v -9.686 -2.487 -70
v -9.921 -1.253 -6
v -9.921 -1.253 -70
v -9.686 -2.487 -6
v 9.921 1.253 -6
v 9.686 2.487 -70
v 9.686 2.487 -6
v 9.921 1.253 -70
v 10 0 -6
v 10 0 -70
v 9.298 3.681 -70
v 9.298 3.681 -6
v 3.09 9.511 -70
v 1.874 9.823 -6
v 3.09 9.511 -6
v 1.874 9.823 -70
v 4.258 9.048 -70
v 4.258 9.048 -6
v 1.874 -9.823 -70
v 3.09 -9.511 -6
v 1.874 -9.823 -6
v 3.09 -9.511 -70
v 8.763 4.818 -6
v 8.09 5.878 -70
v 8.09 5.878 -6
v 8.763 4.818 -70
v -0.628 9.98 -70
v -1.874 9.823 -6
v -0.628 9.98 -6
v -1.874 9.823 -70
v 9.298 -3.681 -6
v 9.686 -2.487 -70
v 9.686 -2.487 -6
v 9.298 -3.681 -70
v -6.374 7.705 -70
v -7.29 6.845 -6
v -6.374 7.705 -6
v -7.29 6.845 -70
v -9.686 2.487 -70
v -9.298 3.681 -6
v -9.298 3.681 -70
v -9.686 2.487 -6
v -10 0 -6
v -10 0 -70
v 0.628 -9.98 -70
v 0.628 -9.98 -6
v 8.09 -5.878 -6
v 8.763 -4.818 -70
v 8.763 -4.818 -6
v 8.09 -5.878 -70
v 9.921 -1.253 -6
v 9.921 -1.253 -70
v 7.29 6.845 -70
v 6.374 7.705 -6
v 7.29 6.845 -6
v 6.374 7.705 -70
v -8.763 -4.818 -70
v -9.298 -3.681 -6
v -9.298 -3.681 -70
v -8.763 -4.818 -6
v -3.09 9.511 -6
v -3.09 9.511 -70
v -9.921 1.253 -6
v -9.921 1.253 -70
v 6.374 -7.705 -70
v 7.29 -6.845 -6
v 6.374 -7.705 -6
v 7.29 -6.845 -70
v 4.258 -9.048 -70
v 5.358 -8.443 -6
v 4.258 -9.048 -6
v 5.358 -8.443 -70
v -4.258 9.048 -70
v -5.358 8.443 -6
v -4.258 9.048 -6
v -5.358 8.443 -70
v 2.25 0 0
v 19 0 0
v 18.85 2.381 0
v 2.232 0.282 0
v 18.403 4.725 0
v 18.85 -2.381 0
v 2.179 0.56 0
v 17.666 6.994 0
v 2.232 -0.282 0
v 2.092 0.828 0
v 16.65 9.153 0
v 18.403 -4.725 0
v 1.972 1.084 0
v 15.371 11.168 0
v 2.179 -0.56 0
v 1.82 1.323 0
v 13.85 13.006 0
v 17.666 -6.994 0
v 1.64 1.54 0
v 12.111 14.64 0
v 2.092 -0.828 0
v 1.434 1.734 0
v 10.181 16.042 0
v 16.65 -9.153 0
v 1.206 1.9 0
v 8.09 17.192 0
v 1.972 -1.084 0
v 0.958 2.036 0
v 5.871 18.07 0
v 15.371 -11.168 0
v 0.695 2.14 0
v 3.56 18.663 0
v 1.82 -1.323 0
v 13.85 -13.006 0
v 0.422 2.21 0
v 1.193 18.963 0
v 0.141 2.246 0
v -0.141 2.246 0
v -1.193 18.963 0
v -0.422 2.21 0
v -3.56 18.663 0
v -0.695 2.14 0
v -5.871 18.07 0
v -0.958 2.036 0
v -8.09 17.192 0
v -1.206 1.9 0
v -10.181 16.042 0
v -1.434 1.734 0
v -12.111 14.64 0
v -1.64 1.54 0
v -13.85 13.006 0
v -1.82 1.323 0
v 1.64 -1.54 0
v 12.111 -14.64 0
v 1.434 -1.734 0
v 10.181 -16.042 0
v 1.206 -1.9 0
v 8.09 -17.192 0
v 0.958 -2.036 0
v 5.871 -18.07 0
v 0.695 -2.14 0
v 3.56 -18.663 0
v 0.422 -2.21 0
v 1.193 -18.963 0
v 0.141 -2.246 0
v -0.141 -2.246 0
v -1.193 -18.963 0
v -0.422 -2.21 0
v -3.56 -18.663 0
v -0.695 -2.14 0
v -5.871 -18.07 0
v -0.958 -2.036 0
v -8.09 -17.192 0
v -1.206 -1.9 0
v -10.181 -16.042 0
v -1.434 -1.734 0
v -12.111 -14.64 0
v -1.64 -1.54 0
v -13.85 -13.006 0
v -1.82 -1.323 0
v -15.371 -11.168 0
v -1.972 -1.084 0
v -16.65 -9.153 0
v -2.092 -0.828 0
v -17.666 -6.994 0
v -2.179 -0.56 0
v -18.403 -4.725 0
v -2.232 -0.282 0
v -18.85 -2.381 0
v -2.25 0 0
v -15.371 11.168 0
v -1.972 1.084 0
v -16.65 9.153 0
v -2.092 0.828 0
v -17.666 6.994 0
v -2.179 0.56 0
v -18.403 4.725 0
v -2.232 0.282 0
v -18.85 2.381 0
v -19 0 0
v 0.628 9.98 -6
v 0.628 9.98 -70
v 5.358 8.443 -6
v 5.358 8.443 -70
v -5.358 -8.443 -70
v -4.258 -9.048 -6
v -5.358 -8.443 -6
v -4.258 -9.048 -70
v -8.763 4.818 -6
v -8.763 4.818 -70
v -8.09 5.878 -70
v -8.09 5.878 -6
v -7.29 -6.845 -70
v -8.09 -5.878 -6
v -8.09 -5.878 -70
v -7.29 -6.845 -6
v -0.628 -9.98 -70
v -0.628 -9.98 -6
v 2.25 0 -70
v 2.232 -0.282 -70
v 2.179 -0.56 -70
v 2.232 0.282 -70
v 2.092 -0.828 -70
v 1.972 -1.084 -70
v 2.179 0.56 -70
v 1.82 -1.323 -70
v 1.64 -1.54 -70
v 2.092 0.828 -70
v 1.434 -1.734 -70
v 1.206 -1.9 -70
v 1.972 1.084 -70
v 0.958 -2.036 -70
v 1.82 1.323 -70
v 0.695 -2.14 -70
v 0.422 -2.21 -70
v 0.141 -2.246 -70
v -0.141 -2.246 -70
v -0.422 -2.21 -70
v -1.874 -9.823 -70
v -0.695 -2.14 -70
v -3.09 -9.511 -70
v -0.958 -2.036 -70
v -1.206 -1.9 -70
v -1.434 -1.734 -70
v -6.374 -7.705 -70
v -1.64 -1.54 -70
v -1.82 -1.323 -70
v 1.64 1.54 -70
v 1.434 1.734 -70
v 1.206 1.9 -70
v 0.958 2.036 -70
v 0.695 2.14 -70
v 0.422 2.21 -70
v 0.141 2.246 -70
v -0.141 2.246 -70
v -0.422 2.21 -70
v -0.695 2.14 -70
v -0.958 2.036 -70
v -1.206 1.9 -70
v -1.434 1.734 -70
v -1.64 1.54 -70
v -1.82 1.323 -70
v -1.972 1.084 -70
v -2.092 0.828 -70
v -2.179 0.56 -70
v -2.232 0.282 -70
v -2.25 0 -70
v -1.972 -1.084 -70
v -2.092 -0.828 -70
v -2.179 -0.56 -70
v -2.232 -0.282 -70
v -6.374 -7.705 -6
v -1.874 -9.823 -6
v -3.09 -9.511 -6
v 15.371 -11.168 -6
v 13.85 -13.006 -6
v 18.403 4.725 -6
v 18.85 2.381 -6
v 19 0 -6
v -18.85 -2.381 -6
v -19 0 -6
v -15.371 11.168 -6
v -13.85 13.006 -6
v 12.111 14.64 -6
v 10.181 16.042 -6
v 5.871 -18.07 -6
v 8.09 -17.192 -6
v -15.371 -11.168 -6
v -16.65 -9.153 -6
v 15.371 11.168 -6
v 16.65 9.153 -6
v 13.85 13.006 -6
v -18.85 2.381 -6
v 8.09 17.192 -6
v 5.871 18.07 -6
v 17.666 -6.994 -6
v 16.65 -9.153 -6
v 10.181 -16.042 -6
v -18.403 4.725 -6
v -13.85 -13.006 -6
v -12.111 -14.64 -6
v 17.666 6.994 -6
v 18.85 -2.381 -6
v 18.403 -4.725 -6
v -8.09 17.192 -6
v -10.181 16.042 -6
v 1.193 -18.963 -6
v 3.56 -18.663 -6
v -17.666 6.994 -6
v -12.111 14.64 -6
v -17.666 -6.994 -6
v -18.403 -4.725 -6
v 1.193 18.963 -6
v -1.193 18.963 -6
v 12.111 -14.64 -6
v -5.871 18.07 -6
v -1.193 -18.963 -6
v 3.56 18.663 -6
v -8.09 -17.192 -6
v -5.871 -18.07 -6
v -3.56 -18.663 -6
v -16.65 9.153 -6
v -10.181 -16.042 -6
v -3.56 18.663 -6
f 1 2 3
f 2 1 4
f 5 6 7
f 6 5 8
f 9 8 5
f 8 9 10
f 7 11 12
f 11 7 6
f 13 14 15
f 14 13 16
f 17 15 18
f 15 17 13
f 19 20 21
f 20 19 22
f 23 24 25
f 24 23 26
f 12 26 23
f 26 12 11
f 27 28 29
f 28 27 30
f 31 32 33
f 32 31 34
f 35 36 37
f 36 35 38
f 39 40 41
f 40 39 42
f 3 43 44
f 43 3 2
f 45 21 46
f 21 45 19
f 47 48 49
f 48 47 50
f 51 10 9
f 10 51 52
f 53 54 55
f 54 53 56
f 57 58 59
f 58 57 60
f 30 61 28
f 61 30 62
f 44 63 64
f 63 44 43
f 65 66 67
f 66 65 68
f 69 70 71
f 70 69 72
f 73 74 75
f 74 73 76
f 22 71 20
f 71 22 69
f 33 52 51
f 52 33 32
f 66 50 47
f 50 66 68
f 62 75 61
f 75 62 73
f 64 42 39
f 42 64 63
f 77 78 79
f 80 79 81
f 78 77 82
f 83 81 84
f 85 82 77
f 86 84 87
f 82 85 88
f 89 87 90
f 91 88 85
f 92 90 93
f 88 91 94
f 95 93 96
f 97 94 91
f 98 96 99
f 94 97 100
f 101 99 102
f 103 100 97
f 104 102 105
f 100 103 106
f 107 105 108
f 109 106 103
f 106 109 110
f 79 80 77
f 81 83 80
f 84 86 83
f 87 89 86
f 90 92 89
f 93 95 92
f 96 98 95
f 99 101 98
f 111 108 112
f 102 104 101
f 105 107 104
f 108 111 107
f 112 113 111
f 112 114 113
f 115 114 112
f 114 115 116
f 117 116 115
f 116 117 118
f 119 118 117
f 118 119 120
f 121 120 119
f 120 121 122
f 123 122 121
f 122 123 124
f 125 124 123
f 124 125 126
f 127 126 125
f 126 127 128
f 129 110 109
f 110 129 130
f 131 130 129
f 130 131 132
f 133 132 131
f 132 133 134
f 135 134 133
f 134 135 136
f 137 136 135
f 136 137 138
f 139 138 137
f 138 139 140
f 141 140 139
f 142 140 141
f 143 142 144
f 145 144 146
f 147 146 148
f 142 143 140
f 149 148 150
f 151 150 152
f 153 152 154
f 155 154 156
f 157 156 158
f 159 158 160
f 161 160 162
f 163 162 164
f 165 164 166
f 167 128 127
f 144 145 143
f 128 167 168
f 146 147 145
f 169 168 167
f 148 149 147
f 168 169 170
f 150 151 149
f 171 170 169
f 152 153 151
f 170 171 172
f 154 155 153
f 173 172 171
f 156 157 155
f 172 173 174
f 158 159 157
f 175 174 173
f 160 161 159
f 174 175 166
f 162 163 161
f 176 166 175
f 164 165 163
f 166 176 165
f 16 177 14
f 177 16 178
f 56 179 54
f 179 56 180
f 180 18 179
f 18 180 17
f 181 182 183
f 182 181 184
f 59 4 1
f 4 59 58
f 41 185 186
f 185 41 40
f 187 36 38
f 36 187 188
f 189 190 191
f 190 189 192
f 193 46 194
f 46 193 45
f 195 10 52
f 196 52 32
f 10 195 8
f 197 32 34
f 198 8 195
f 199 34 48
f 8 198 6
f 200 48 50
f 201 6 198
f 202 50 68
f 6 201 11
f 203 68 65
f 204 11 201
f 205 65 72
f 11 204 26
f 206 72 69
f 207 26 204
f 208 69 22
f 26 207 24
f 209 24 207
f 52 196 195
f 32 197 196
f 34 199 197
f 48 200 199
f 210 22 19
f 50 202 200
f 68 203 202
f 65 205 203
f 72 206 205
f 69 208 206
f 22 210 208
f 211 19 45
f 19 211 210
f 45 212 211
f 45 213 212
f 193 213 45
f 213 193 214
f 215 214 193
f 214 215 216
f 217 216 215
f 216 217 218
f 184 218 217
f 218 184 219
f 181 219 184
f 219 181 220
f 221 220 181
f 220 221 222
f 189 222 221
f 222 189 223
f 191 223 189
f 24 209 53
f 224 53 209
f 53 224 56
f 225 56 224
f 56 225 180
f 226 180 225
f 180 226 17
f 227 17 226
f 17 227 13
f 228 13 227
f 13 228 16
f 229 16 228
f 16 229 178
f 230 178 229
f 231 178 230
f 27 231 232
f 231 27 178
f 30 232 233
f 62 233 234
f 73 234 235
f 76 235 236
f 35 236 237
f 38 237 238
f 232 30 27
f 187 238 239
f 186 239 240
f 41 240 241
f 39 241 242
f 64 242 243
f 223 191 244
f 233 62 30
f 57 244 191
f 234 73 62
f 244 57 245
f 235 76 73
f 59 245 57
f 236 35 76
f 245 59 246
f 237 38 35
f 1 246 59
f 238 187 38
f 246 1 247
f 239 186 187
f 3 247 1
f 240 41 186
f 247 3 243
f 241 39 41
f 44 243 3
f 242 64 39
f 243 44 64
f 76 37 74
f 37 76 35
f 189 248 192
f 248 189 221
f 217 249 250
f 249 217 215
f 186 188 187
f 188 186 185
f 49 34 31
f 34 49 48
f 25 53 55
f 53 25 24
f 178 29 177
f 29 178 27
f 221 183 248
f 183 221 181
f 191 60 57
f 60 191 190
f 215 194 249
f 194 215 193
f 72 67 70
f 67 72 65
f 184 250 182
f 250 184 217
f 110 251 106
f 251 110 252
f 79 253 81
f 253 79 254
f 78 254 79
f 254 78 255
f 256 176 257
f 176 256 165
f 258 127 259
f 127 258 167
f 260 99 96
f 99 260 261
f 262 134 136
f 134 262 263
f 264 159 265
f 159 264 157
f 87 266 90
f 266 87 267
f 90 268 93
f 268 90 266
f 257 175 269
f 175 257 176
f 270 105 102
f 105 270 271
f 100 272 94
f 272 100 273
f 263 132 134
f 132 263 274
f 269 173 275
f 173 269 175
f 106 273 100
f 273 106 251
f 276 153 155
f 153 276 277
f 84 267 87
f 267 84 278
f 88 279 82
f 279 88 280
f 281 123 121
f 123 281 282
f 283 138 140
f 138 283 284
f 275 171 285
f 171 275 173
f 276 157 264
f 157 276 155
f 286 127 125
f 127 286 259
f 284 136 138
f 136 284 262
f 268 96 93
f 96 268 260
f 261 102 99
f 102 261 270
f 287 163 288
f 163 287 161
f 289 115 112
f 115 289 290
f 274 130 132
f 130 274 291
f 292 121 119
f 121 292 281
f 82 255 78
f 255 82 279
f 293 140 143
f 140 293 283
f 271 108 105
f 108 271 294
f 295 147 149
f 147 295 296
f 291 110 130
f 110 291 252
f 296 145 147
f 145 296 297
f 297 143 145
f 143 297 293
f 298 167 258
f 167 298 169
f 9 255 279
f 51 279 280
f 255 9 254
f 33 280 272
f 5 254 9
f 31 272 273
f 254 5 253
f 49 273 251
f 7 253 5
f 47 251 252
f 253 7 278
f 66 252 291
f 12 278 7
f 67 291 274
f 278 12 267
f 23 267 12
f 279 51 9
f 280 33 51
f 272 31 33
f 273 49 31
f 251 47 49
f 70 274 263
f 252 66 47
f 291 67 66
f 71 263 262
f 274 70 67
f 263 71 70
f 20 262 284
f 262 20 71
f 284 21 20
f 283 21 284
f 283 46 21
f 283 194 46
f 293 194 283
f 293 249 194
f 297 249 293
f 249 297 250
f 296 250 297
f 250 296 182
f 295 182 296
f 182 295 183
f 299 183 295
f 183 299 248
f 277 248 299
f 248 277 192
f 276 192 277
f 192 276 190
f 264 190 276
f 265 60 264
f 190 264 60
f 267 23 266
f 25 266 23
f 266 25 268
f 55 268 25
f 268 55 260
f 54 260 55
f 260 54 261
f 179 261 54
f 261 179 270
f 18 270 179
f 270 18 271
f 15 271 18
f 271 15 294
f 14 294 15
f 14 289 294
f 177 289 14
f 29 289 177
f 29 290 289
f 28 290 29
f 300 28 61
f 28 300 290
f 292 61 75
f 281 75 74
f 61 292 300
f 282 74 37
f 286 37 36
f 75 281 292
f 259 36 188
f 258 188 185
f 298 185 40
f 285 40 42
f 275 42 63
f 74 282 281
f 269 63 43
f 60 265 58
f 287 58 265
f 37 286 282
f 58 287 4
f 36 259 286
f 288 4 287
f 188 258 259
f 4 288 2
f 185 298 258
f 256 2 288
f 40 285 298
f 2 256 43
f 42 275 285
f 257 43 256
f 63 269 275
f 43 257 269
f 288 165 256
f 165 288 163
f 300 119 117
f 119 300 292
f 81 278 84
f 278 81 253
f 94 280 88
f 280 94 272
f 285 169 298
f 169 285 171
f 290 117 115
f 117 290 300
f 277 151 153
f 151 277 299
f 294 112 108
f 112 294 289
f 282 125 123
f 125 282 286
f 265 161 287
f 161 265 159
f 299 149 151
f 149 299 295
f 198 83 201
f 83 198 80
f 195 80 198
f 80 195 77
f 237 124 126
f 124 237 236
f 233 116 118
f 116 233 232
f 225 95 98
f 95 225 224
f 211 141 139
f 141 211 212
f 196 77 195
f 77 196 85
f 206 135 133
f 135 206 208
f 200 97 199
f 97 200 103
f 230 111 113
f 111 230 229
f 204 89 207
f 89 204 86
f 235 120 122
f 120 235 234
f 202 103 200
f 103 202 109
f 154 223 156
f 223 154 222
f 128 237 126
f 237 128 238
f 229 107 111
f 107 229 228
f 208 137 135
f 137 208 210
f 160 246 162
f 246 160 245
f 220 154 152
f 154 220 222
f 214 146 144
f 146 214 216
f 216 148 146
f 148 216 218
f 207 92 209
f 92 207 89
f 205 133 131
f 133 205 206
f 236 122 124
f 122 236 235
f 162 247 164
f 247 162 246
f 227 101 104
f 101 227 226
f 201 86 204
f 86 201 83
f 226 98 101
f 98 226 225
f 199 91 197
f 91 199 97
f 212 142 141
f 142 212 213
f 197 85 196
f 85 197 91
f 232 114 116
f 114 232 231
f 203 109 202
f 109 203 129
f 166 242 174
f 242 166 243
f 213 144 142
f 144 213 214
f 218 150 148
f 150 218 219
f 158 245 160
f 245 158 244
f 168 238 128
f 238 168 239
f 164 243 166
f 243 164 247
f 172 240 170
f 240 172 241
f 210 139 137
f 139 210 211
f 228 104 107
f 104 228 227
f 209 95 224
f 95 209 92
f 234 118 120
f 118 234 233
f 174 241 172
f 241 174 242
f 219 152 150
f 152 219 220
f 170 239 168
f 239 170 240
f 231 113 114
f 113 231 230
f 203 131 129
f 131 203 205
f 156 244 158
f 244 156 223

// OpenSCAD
$fn = 50;


difference() {
	union() {
		translate(v = [0, 0, -70.0000000000]) {
			cylinder(h = 70, r = 10.0000000000);
		}
		translate(v = [0, 0, -6.0000000000]) {
			cylinder(h = 6, r = 19.0000000000);
		}
	}
	union() {
		#translate(v = [0, 0, -70]) {
			cylinder(h = 70, r = 2.2500000000);
		}
	}
}
